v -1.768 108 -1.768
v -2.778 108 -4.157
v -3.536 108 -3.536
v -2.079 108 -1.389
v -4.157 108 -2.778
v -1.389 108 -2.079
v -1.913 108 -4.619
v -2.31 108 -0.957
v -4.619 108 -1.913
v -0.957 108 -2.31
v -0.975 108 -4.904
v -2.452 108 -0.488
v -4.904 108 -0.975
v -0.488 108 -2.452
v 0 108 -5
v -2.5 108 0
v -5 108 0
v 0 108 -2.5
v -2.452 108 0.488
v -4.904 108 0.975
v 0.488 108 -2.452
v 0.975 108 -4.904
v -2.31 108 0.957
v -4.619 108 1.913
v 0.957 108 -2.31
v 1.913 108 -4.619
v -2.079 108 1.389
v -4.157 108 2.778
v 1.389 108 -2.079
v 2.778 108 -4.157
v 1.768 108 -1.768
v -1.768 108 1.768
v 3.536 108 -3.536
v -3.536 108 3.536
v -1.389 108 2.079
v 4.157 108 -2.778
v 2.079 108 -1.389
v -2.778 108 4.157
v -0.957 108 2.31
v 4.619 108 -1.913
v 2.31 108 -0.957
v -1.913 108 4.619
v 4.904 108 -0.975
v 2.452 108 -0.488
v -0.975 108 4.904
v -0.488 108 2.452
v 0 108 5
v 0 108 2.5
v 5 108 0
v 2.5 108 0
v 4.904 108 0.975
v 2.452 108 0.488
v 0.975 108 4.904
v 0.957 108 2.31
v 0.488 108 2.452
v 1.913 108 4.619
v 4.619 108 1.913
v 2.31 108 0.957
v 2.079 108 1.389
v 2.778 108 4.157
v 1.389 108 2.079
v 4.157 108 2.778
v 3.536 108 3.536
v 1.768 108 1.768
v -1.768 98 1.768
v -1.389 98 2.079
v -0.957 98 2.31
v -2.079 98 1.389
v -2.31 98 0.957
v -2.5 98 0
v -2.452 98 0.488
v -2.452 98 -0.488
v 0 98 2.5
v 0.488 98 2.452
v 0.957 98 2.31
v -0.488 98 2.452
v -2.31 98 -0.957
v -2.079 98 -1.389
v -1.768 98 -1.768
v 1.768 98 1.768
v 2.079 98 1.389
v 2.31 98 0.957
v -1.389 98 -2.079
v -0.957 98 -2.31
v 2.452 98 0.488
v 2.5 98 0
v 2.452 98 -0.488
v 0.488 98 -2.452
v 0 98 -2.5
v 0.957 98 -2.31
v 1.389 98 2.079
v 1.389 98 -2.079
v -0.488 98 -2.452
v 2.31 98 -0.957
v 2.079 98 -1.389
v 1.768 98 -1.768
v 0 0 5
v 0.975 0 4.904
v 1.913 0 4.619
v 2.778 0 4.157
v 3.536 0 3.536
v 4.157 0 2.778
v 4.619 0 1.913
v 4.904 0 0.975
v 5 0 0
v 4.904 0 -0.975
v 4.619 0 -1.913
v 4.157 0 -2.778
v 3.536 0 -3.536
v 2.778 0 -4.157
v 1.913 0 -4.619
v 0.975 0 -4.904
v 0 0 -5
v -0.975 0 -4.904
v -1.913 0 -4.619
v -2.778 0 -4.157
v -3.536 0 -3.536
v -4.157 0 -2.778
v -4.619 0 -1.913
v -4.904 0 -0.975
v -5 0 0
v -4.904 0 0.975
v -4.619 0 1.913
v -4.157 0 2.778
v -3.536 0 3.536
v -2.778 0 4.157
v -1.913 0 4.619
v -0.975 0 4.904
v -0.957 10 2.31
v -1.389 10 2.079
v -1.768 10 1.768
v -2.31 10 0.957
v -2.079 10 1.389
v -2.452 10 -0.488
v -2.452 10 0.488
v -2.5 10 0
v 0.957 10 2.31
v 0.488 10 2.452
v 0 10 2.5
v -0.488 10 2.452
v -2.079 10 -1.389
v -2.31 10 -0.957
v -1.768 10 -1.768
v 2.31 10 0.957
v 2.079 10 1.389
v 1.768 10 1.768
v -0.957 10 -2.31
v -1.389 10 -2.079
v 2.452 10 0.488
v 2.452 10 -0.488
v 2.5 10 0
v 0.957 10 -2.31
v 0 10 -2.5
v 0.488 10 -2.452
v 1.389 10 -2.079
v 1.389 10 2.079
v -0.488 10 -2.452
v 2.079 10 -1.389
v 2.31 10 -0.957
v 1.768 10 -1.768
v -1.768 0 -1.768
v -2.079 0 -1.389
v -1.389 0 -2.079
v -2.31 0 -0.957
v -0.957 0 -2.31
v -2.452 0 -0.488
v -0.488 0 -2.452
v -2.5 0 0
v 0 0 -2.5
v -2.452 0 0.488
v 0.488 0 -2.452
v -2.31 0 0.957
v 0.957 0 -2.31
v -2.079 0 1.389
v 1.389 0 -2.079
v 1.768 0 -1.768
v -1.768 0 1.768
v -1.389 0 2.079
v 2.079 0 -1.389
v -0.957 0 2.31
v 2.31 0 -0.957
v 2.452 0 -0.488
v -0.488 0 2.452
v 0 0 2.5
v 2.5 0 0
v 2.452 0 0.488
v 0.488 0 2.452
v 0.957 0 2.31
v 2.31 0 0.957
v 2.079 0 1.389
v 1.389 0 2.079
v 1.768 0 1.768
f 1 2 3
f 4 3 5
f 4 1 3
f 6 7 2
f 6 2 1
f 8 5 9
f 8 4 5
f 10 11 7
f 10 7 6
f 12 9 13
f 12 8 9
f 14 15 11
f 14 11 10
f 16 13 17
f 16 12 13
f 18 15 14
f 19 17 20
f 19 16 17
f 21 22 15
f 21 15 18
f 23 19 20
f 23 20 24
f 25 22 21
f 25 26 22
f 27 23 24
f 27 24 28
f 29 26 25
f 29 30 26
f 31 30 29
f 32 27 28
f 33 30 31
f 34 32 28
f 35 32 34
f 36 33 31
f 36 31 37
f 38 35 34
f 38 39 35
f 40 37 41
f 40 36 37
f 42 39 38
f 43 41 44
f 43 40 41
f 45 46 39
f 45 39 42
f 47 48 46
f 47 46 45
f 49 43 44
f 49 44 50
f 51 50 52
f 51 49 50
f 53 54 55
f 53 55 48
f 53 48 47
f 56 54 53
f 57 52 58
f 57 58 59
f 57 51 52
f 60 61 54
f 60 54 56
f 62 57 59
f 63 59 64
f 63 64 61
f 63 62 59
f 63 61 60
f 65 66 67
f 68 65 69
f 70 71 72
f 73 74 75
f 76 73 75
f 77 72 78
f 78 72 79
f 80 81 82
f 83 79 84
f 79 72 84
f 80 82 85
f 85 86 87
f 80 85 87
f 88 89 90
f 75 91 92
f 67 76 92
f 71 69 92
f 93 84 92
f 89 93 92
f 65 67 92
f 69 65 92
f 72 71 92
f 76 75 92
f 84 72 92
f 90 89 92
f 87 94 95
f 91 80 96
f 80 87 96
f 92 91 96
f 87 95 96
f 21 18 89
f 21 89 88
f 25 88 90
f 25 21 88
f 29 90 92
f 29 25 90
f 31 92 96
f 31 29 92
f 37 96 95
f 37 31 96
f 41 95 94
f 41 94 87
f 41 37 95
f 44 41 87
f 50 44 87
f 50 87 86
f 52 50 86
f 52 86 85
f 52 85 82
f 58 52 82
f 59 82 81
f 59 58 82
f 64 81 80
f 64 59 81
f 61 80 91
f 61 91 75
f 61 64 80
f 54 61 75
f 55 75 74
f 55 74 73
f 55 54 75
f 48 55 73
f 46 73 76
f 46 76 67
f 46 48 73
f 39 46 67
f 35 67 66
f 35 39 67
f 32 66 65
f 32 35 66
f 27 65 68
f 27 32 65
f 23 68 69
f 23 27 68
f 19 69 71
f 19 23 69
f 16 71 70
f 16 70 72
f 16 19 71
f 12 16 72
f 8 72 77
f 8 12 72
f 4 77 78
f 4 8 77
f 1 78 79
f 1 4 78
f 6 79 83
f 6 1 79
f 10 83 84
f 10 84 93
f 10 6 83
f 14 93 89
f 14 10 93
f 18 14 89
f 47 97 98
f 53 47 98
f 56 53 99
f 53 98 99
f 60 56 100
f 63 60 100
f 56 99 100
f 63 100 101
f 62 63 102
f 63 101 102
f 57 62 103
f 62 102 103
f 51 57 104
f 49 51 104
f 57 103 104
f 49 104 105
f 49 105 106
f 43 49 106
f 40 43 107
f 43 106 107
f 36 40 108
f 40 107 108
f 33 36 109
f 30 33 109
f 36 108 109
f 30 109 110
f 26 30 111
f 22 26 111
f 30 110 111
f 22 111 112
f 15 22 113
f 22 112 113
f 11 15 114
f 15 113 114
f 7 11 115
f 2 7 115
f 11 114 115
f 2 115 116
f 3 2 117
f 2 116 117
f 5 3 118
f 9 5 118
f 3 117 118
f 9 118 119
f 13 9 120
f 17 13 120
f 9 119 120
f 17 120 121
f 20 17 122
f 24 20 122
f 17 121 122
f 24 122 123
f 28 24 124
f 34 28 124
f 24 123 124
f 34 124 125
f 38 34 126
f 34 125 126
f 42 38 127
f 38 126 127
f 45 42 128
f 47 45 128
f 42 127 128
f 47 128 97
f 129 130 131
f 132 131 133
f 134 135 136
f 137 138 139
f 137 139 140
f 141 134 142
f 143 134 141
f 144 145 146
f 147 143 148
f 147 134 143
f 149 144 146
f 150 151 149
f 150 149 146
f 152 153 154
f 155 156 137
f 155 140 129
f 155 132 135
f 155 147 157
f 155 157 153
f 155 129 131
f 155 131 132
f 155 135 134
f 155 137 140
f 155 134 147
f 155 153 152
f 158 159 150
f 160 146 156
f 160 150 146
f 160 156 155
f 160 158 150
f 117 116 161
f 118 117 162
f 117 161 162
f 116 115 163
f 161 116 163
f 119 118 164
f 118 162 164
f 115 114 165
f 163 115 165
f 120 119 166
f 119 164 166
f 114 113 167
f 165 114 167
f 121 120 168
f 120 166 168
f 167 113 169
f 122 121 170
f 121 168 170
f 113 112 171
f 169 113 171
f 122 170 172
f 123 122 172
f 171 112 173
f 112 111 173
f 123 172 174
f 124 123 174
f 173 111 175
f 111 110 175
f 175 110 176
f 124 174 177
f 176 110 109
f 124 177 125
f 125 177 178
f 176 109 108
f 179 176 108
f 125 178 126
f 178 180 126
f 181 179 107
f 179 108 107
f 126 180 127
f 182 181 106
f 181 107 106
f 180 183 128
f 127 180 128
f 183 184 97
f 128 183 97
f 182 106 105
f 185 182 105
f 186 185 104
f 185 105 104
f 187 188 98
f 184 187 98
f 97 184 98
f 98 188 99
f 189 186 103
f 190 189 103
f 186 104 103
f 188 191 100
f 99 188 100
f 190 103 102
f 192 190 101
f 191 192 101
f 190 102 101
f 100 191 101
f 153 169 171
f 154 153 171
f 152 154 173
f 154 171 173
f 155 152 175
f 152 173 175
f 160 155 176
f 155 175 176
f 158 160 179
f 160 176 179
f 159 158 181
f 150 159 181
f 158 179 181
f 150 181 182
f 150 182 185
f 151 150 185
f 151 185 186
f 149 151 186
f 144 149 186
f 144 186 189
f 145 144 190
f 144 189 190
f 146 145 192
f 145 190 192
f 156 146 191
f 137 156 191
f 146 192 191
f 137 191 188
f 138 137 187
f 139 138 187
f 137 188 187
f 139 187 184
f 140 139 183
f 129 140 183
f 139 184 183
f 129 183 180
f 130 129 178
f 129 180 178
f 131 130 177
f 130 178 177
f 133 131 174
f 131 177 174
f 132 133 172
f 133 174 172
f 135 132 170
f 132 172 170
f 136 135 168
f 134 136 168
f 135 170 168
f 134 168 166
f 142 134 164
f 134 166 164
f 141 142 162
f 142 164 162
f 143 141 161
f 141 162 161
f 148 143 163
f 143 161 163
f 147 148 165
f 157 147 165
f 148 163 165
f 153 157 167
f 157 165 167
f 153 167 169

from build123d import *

# Parameters (mm, degrees)
CROQUIS1_R              = 5
SALIENTE_EXTRUIR1_DEPTH = 108
CROQUIS2_R              = 2.5
CORTAR_EXTRUIR1_DEPTH   = 10


with BuildPart() as part:
    # Croquis1 → Saliente-Extruir1 (new body)
    with BuildSketch(Plane(origin=(0, 0, 0), x_dir=(1, 0, 0), z_dir=(0, 1, 0))):
        with Locations(Location((0, 0, 0), (0, 0, 270))):
            Circle(CROQUIS1_R)
    extrude(amount=SALIENTE_EXTRUIR1_DEPTH)

    # Croquis2 → Cortar-Extruir1 (cut)
    with BuildSketch(Plane.XZ):
        with Locations(Location((0, 0, 0), (0, 0, 270))):
            Circle(CROQUIS2_R)
    cortar_extruir1 = extrude(amount=-CORTAR_EXTRUIR1_DEPTH, mode=Mode.SUBTRACT)

    # Simetría1: Cortar-Extruir1 across plane
    add(cortar_extruir1.mirror(Plane(origin=(0, 54, 0), x_dir=(0, 0, 1), z_dir=(0, -1, 0))), mode=Mode.SUBTRACT)


solid = part.part
